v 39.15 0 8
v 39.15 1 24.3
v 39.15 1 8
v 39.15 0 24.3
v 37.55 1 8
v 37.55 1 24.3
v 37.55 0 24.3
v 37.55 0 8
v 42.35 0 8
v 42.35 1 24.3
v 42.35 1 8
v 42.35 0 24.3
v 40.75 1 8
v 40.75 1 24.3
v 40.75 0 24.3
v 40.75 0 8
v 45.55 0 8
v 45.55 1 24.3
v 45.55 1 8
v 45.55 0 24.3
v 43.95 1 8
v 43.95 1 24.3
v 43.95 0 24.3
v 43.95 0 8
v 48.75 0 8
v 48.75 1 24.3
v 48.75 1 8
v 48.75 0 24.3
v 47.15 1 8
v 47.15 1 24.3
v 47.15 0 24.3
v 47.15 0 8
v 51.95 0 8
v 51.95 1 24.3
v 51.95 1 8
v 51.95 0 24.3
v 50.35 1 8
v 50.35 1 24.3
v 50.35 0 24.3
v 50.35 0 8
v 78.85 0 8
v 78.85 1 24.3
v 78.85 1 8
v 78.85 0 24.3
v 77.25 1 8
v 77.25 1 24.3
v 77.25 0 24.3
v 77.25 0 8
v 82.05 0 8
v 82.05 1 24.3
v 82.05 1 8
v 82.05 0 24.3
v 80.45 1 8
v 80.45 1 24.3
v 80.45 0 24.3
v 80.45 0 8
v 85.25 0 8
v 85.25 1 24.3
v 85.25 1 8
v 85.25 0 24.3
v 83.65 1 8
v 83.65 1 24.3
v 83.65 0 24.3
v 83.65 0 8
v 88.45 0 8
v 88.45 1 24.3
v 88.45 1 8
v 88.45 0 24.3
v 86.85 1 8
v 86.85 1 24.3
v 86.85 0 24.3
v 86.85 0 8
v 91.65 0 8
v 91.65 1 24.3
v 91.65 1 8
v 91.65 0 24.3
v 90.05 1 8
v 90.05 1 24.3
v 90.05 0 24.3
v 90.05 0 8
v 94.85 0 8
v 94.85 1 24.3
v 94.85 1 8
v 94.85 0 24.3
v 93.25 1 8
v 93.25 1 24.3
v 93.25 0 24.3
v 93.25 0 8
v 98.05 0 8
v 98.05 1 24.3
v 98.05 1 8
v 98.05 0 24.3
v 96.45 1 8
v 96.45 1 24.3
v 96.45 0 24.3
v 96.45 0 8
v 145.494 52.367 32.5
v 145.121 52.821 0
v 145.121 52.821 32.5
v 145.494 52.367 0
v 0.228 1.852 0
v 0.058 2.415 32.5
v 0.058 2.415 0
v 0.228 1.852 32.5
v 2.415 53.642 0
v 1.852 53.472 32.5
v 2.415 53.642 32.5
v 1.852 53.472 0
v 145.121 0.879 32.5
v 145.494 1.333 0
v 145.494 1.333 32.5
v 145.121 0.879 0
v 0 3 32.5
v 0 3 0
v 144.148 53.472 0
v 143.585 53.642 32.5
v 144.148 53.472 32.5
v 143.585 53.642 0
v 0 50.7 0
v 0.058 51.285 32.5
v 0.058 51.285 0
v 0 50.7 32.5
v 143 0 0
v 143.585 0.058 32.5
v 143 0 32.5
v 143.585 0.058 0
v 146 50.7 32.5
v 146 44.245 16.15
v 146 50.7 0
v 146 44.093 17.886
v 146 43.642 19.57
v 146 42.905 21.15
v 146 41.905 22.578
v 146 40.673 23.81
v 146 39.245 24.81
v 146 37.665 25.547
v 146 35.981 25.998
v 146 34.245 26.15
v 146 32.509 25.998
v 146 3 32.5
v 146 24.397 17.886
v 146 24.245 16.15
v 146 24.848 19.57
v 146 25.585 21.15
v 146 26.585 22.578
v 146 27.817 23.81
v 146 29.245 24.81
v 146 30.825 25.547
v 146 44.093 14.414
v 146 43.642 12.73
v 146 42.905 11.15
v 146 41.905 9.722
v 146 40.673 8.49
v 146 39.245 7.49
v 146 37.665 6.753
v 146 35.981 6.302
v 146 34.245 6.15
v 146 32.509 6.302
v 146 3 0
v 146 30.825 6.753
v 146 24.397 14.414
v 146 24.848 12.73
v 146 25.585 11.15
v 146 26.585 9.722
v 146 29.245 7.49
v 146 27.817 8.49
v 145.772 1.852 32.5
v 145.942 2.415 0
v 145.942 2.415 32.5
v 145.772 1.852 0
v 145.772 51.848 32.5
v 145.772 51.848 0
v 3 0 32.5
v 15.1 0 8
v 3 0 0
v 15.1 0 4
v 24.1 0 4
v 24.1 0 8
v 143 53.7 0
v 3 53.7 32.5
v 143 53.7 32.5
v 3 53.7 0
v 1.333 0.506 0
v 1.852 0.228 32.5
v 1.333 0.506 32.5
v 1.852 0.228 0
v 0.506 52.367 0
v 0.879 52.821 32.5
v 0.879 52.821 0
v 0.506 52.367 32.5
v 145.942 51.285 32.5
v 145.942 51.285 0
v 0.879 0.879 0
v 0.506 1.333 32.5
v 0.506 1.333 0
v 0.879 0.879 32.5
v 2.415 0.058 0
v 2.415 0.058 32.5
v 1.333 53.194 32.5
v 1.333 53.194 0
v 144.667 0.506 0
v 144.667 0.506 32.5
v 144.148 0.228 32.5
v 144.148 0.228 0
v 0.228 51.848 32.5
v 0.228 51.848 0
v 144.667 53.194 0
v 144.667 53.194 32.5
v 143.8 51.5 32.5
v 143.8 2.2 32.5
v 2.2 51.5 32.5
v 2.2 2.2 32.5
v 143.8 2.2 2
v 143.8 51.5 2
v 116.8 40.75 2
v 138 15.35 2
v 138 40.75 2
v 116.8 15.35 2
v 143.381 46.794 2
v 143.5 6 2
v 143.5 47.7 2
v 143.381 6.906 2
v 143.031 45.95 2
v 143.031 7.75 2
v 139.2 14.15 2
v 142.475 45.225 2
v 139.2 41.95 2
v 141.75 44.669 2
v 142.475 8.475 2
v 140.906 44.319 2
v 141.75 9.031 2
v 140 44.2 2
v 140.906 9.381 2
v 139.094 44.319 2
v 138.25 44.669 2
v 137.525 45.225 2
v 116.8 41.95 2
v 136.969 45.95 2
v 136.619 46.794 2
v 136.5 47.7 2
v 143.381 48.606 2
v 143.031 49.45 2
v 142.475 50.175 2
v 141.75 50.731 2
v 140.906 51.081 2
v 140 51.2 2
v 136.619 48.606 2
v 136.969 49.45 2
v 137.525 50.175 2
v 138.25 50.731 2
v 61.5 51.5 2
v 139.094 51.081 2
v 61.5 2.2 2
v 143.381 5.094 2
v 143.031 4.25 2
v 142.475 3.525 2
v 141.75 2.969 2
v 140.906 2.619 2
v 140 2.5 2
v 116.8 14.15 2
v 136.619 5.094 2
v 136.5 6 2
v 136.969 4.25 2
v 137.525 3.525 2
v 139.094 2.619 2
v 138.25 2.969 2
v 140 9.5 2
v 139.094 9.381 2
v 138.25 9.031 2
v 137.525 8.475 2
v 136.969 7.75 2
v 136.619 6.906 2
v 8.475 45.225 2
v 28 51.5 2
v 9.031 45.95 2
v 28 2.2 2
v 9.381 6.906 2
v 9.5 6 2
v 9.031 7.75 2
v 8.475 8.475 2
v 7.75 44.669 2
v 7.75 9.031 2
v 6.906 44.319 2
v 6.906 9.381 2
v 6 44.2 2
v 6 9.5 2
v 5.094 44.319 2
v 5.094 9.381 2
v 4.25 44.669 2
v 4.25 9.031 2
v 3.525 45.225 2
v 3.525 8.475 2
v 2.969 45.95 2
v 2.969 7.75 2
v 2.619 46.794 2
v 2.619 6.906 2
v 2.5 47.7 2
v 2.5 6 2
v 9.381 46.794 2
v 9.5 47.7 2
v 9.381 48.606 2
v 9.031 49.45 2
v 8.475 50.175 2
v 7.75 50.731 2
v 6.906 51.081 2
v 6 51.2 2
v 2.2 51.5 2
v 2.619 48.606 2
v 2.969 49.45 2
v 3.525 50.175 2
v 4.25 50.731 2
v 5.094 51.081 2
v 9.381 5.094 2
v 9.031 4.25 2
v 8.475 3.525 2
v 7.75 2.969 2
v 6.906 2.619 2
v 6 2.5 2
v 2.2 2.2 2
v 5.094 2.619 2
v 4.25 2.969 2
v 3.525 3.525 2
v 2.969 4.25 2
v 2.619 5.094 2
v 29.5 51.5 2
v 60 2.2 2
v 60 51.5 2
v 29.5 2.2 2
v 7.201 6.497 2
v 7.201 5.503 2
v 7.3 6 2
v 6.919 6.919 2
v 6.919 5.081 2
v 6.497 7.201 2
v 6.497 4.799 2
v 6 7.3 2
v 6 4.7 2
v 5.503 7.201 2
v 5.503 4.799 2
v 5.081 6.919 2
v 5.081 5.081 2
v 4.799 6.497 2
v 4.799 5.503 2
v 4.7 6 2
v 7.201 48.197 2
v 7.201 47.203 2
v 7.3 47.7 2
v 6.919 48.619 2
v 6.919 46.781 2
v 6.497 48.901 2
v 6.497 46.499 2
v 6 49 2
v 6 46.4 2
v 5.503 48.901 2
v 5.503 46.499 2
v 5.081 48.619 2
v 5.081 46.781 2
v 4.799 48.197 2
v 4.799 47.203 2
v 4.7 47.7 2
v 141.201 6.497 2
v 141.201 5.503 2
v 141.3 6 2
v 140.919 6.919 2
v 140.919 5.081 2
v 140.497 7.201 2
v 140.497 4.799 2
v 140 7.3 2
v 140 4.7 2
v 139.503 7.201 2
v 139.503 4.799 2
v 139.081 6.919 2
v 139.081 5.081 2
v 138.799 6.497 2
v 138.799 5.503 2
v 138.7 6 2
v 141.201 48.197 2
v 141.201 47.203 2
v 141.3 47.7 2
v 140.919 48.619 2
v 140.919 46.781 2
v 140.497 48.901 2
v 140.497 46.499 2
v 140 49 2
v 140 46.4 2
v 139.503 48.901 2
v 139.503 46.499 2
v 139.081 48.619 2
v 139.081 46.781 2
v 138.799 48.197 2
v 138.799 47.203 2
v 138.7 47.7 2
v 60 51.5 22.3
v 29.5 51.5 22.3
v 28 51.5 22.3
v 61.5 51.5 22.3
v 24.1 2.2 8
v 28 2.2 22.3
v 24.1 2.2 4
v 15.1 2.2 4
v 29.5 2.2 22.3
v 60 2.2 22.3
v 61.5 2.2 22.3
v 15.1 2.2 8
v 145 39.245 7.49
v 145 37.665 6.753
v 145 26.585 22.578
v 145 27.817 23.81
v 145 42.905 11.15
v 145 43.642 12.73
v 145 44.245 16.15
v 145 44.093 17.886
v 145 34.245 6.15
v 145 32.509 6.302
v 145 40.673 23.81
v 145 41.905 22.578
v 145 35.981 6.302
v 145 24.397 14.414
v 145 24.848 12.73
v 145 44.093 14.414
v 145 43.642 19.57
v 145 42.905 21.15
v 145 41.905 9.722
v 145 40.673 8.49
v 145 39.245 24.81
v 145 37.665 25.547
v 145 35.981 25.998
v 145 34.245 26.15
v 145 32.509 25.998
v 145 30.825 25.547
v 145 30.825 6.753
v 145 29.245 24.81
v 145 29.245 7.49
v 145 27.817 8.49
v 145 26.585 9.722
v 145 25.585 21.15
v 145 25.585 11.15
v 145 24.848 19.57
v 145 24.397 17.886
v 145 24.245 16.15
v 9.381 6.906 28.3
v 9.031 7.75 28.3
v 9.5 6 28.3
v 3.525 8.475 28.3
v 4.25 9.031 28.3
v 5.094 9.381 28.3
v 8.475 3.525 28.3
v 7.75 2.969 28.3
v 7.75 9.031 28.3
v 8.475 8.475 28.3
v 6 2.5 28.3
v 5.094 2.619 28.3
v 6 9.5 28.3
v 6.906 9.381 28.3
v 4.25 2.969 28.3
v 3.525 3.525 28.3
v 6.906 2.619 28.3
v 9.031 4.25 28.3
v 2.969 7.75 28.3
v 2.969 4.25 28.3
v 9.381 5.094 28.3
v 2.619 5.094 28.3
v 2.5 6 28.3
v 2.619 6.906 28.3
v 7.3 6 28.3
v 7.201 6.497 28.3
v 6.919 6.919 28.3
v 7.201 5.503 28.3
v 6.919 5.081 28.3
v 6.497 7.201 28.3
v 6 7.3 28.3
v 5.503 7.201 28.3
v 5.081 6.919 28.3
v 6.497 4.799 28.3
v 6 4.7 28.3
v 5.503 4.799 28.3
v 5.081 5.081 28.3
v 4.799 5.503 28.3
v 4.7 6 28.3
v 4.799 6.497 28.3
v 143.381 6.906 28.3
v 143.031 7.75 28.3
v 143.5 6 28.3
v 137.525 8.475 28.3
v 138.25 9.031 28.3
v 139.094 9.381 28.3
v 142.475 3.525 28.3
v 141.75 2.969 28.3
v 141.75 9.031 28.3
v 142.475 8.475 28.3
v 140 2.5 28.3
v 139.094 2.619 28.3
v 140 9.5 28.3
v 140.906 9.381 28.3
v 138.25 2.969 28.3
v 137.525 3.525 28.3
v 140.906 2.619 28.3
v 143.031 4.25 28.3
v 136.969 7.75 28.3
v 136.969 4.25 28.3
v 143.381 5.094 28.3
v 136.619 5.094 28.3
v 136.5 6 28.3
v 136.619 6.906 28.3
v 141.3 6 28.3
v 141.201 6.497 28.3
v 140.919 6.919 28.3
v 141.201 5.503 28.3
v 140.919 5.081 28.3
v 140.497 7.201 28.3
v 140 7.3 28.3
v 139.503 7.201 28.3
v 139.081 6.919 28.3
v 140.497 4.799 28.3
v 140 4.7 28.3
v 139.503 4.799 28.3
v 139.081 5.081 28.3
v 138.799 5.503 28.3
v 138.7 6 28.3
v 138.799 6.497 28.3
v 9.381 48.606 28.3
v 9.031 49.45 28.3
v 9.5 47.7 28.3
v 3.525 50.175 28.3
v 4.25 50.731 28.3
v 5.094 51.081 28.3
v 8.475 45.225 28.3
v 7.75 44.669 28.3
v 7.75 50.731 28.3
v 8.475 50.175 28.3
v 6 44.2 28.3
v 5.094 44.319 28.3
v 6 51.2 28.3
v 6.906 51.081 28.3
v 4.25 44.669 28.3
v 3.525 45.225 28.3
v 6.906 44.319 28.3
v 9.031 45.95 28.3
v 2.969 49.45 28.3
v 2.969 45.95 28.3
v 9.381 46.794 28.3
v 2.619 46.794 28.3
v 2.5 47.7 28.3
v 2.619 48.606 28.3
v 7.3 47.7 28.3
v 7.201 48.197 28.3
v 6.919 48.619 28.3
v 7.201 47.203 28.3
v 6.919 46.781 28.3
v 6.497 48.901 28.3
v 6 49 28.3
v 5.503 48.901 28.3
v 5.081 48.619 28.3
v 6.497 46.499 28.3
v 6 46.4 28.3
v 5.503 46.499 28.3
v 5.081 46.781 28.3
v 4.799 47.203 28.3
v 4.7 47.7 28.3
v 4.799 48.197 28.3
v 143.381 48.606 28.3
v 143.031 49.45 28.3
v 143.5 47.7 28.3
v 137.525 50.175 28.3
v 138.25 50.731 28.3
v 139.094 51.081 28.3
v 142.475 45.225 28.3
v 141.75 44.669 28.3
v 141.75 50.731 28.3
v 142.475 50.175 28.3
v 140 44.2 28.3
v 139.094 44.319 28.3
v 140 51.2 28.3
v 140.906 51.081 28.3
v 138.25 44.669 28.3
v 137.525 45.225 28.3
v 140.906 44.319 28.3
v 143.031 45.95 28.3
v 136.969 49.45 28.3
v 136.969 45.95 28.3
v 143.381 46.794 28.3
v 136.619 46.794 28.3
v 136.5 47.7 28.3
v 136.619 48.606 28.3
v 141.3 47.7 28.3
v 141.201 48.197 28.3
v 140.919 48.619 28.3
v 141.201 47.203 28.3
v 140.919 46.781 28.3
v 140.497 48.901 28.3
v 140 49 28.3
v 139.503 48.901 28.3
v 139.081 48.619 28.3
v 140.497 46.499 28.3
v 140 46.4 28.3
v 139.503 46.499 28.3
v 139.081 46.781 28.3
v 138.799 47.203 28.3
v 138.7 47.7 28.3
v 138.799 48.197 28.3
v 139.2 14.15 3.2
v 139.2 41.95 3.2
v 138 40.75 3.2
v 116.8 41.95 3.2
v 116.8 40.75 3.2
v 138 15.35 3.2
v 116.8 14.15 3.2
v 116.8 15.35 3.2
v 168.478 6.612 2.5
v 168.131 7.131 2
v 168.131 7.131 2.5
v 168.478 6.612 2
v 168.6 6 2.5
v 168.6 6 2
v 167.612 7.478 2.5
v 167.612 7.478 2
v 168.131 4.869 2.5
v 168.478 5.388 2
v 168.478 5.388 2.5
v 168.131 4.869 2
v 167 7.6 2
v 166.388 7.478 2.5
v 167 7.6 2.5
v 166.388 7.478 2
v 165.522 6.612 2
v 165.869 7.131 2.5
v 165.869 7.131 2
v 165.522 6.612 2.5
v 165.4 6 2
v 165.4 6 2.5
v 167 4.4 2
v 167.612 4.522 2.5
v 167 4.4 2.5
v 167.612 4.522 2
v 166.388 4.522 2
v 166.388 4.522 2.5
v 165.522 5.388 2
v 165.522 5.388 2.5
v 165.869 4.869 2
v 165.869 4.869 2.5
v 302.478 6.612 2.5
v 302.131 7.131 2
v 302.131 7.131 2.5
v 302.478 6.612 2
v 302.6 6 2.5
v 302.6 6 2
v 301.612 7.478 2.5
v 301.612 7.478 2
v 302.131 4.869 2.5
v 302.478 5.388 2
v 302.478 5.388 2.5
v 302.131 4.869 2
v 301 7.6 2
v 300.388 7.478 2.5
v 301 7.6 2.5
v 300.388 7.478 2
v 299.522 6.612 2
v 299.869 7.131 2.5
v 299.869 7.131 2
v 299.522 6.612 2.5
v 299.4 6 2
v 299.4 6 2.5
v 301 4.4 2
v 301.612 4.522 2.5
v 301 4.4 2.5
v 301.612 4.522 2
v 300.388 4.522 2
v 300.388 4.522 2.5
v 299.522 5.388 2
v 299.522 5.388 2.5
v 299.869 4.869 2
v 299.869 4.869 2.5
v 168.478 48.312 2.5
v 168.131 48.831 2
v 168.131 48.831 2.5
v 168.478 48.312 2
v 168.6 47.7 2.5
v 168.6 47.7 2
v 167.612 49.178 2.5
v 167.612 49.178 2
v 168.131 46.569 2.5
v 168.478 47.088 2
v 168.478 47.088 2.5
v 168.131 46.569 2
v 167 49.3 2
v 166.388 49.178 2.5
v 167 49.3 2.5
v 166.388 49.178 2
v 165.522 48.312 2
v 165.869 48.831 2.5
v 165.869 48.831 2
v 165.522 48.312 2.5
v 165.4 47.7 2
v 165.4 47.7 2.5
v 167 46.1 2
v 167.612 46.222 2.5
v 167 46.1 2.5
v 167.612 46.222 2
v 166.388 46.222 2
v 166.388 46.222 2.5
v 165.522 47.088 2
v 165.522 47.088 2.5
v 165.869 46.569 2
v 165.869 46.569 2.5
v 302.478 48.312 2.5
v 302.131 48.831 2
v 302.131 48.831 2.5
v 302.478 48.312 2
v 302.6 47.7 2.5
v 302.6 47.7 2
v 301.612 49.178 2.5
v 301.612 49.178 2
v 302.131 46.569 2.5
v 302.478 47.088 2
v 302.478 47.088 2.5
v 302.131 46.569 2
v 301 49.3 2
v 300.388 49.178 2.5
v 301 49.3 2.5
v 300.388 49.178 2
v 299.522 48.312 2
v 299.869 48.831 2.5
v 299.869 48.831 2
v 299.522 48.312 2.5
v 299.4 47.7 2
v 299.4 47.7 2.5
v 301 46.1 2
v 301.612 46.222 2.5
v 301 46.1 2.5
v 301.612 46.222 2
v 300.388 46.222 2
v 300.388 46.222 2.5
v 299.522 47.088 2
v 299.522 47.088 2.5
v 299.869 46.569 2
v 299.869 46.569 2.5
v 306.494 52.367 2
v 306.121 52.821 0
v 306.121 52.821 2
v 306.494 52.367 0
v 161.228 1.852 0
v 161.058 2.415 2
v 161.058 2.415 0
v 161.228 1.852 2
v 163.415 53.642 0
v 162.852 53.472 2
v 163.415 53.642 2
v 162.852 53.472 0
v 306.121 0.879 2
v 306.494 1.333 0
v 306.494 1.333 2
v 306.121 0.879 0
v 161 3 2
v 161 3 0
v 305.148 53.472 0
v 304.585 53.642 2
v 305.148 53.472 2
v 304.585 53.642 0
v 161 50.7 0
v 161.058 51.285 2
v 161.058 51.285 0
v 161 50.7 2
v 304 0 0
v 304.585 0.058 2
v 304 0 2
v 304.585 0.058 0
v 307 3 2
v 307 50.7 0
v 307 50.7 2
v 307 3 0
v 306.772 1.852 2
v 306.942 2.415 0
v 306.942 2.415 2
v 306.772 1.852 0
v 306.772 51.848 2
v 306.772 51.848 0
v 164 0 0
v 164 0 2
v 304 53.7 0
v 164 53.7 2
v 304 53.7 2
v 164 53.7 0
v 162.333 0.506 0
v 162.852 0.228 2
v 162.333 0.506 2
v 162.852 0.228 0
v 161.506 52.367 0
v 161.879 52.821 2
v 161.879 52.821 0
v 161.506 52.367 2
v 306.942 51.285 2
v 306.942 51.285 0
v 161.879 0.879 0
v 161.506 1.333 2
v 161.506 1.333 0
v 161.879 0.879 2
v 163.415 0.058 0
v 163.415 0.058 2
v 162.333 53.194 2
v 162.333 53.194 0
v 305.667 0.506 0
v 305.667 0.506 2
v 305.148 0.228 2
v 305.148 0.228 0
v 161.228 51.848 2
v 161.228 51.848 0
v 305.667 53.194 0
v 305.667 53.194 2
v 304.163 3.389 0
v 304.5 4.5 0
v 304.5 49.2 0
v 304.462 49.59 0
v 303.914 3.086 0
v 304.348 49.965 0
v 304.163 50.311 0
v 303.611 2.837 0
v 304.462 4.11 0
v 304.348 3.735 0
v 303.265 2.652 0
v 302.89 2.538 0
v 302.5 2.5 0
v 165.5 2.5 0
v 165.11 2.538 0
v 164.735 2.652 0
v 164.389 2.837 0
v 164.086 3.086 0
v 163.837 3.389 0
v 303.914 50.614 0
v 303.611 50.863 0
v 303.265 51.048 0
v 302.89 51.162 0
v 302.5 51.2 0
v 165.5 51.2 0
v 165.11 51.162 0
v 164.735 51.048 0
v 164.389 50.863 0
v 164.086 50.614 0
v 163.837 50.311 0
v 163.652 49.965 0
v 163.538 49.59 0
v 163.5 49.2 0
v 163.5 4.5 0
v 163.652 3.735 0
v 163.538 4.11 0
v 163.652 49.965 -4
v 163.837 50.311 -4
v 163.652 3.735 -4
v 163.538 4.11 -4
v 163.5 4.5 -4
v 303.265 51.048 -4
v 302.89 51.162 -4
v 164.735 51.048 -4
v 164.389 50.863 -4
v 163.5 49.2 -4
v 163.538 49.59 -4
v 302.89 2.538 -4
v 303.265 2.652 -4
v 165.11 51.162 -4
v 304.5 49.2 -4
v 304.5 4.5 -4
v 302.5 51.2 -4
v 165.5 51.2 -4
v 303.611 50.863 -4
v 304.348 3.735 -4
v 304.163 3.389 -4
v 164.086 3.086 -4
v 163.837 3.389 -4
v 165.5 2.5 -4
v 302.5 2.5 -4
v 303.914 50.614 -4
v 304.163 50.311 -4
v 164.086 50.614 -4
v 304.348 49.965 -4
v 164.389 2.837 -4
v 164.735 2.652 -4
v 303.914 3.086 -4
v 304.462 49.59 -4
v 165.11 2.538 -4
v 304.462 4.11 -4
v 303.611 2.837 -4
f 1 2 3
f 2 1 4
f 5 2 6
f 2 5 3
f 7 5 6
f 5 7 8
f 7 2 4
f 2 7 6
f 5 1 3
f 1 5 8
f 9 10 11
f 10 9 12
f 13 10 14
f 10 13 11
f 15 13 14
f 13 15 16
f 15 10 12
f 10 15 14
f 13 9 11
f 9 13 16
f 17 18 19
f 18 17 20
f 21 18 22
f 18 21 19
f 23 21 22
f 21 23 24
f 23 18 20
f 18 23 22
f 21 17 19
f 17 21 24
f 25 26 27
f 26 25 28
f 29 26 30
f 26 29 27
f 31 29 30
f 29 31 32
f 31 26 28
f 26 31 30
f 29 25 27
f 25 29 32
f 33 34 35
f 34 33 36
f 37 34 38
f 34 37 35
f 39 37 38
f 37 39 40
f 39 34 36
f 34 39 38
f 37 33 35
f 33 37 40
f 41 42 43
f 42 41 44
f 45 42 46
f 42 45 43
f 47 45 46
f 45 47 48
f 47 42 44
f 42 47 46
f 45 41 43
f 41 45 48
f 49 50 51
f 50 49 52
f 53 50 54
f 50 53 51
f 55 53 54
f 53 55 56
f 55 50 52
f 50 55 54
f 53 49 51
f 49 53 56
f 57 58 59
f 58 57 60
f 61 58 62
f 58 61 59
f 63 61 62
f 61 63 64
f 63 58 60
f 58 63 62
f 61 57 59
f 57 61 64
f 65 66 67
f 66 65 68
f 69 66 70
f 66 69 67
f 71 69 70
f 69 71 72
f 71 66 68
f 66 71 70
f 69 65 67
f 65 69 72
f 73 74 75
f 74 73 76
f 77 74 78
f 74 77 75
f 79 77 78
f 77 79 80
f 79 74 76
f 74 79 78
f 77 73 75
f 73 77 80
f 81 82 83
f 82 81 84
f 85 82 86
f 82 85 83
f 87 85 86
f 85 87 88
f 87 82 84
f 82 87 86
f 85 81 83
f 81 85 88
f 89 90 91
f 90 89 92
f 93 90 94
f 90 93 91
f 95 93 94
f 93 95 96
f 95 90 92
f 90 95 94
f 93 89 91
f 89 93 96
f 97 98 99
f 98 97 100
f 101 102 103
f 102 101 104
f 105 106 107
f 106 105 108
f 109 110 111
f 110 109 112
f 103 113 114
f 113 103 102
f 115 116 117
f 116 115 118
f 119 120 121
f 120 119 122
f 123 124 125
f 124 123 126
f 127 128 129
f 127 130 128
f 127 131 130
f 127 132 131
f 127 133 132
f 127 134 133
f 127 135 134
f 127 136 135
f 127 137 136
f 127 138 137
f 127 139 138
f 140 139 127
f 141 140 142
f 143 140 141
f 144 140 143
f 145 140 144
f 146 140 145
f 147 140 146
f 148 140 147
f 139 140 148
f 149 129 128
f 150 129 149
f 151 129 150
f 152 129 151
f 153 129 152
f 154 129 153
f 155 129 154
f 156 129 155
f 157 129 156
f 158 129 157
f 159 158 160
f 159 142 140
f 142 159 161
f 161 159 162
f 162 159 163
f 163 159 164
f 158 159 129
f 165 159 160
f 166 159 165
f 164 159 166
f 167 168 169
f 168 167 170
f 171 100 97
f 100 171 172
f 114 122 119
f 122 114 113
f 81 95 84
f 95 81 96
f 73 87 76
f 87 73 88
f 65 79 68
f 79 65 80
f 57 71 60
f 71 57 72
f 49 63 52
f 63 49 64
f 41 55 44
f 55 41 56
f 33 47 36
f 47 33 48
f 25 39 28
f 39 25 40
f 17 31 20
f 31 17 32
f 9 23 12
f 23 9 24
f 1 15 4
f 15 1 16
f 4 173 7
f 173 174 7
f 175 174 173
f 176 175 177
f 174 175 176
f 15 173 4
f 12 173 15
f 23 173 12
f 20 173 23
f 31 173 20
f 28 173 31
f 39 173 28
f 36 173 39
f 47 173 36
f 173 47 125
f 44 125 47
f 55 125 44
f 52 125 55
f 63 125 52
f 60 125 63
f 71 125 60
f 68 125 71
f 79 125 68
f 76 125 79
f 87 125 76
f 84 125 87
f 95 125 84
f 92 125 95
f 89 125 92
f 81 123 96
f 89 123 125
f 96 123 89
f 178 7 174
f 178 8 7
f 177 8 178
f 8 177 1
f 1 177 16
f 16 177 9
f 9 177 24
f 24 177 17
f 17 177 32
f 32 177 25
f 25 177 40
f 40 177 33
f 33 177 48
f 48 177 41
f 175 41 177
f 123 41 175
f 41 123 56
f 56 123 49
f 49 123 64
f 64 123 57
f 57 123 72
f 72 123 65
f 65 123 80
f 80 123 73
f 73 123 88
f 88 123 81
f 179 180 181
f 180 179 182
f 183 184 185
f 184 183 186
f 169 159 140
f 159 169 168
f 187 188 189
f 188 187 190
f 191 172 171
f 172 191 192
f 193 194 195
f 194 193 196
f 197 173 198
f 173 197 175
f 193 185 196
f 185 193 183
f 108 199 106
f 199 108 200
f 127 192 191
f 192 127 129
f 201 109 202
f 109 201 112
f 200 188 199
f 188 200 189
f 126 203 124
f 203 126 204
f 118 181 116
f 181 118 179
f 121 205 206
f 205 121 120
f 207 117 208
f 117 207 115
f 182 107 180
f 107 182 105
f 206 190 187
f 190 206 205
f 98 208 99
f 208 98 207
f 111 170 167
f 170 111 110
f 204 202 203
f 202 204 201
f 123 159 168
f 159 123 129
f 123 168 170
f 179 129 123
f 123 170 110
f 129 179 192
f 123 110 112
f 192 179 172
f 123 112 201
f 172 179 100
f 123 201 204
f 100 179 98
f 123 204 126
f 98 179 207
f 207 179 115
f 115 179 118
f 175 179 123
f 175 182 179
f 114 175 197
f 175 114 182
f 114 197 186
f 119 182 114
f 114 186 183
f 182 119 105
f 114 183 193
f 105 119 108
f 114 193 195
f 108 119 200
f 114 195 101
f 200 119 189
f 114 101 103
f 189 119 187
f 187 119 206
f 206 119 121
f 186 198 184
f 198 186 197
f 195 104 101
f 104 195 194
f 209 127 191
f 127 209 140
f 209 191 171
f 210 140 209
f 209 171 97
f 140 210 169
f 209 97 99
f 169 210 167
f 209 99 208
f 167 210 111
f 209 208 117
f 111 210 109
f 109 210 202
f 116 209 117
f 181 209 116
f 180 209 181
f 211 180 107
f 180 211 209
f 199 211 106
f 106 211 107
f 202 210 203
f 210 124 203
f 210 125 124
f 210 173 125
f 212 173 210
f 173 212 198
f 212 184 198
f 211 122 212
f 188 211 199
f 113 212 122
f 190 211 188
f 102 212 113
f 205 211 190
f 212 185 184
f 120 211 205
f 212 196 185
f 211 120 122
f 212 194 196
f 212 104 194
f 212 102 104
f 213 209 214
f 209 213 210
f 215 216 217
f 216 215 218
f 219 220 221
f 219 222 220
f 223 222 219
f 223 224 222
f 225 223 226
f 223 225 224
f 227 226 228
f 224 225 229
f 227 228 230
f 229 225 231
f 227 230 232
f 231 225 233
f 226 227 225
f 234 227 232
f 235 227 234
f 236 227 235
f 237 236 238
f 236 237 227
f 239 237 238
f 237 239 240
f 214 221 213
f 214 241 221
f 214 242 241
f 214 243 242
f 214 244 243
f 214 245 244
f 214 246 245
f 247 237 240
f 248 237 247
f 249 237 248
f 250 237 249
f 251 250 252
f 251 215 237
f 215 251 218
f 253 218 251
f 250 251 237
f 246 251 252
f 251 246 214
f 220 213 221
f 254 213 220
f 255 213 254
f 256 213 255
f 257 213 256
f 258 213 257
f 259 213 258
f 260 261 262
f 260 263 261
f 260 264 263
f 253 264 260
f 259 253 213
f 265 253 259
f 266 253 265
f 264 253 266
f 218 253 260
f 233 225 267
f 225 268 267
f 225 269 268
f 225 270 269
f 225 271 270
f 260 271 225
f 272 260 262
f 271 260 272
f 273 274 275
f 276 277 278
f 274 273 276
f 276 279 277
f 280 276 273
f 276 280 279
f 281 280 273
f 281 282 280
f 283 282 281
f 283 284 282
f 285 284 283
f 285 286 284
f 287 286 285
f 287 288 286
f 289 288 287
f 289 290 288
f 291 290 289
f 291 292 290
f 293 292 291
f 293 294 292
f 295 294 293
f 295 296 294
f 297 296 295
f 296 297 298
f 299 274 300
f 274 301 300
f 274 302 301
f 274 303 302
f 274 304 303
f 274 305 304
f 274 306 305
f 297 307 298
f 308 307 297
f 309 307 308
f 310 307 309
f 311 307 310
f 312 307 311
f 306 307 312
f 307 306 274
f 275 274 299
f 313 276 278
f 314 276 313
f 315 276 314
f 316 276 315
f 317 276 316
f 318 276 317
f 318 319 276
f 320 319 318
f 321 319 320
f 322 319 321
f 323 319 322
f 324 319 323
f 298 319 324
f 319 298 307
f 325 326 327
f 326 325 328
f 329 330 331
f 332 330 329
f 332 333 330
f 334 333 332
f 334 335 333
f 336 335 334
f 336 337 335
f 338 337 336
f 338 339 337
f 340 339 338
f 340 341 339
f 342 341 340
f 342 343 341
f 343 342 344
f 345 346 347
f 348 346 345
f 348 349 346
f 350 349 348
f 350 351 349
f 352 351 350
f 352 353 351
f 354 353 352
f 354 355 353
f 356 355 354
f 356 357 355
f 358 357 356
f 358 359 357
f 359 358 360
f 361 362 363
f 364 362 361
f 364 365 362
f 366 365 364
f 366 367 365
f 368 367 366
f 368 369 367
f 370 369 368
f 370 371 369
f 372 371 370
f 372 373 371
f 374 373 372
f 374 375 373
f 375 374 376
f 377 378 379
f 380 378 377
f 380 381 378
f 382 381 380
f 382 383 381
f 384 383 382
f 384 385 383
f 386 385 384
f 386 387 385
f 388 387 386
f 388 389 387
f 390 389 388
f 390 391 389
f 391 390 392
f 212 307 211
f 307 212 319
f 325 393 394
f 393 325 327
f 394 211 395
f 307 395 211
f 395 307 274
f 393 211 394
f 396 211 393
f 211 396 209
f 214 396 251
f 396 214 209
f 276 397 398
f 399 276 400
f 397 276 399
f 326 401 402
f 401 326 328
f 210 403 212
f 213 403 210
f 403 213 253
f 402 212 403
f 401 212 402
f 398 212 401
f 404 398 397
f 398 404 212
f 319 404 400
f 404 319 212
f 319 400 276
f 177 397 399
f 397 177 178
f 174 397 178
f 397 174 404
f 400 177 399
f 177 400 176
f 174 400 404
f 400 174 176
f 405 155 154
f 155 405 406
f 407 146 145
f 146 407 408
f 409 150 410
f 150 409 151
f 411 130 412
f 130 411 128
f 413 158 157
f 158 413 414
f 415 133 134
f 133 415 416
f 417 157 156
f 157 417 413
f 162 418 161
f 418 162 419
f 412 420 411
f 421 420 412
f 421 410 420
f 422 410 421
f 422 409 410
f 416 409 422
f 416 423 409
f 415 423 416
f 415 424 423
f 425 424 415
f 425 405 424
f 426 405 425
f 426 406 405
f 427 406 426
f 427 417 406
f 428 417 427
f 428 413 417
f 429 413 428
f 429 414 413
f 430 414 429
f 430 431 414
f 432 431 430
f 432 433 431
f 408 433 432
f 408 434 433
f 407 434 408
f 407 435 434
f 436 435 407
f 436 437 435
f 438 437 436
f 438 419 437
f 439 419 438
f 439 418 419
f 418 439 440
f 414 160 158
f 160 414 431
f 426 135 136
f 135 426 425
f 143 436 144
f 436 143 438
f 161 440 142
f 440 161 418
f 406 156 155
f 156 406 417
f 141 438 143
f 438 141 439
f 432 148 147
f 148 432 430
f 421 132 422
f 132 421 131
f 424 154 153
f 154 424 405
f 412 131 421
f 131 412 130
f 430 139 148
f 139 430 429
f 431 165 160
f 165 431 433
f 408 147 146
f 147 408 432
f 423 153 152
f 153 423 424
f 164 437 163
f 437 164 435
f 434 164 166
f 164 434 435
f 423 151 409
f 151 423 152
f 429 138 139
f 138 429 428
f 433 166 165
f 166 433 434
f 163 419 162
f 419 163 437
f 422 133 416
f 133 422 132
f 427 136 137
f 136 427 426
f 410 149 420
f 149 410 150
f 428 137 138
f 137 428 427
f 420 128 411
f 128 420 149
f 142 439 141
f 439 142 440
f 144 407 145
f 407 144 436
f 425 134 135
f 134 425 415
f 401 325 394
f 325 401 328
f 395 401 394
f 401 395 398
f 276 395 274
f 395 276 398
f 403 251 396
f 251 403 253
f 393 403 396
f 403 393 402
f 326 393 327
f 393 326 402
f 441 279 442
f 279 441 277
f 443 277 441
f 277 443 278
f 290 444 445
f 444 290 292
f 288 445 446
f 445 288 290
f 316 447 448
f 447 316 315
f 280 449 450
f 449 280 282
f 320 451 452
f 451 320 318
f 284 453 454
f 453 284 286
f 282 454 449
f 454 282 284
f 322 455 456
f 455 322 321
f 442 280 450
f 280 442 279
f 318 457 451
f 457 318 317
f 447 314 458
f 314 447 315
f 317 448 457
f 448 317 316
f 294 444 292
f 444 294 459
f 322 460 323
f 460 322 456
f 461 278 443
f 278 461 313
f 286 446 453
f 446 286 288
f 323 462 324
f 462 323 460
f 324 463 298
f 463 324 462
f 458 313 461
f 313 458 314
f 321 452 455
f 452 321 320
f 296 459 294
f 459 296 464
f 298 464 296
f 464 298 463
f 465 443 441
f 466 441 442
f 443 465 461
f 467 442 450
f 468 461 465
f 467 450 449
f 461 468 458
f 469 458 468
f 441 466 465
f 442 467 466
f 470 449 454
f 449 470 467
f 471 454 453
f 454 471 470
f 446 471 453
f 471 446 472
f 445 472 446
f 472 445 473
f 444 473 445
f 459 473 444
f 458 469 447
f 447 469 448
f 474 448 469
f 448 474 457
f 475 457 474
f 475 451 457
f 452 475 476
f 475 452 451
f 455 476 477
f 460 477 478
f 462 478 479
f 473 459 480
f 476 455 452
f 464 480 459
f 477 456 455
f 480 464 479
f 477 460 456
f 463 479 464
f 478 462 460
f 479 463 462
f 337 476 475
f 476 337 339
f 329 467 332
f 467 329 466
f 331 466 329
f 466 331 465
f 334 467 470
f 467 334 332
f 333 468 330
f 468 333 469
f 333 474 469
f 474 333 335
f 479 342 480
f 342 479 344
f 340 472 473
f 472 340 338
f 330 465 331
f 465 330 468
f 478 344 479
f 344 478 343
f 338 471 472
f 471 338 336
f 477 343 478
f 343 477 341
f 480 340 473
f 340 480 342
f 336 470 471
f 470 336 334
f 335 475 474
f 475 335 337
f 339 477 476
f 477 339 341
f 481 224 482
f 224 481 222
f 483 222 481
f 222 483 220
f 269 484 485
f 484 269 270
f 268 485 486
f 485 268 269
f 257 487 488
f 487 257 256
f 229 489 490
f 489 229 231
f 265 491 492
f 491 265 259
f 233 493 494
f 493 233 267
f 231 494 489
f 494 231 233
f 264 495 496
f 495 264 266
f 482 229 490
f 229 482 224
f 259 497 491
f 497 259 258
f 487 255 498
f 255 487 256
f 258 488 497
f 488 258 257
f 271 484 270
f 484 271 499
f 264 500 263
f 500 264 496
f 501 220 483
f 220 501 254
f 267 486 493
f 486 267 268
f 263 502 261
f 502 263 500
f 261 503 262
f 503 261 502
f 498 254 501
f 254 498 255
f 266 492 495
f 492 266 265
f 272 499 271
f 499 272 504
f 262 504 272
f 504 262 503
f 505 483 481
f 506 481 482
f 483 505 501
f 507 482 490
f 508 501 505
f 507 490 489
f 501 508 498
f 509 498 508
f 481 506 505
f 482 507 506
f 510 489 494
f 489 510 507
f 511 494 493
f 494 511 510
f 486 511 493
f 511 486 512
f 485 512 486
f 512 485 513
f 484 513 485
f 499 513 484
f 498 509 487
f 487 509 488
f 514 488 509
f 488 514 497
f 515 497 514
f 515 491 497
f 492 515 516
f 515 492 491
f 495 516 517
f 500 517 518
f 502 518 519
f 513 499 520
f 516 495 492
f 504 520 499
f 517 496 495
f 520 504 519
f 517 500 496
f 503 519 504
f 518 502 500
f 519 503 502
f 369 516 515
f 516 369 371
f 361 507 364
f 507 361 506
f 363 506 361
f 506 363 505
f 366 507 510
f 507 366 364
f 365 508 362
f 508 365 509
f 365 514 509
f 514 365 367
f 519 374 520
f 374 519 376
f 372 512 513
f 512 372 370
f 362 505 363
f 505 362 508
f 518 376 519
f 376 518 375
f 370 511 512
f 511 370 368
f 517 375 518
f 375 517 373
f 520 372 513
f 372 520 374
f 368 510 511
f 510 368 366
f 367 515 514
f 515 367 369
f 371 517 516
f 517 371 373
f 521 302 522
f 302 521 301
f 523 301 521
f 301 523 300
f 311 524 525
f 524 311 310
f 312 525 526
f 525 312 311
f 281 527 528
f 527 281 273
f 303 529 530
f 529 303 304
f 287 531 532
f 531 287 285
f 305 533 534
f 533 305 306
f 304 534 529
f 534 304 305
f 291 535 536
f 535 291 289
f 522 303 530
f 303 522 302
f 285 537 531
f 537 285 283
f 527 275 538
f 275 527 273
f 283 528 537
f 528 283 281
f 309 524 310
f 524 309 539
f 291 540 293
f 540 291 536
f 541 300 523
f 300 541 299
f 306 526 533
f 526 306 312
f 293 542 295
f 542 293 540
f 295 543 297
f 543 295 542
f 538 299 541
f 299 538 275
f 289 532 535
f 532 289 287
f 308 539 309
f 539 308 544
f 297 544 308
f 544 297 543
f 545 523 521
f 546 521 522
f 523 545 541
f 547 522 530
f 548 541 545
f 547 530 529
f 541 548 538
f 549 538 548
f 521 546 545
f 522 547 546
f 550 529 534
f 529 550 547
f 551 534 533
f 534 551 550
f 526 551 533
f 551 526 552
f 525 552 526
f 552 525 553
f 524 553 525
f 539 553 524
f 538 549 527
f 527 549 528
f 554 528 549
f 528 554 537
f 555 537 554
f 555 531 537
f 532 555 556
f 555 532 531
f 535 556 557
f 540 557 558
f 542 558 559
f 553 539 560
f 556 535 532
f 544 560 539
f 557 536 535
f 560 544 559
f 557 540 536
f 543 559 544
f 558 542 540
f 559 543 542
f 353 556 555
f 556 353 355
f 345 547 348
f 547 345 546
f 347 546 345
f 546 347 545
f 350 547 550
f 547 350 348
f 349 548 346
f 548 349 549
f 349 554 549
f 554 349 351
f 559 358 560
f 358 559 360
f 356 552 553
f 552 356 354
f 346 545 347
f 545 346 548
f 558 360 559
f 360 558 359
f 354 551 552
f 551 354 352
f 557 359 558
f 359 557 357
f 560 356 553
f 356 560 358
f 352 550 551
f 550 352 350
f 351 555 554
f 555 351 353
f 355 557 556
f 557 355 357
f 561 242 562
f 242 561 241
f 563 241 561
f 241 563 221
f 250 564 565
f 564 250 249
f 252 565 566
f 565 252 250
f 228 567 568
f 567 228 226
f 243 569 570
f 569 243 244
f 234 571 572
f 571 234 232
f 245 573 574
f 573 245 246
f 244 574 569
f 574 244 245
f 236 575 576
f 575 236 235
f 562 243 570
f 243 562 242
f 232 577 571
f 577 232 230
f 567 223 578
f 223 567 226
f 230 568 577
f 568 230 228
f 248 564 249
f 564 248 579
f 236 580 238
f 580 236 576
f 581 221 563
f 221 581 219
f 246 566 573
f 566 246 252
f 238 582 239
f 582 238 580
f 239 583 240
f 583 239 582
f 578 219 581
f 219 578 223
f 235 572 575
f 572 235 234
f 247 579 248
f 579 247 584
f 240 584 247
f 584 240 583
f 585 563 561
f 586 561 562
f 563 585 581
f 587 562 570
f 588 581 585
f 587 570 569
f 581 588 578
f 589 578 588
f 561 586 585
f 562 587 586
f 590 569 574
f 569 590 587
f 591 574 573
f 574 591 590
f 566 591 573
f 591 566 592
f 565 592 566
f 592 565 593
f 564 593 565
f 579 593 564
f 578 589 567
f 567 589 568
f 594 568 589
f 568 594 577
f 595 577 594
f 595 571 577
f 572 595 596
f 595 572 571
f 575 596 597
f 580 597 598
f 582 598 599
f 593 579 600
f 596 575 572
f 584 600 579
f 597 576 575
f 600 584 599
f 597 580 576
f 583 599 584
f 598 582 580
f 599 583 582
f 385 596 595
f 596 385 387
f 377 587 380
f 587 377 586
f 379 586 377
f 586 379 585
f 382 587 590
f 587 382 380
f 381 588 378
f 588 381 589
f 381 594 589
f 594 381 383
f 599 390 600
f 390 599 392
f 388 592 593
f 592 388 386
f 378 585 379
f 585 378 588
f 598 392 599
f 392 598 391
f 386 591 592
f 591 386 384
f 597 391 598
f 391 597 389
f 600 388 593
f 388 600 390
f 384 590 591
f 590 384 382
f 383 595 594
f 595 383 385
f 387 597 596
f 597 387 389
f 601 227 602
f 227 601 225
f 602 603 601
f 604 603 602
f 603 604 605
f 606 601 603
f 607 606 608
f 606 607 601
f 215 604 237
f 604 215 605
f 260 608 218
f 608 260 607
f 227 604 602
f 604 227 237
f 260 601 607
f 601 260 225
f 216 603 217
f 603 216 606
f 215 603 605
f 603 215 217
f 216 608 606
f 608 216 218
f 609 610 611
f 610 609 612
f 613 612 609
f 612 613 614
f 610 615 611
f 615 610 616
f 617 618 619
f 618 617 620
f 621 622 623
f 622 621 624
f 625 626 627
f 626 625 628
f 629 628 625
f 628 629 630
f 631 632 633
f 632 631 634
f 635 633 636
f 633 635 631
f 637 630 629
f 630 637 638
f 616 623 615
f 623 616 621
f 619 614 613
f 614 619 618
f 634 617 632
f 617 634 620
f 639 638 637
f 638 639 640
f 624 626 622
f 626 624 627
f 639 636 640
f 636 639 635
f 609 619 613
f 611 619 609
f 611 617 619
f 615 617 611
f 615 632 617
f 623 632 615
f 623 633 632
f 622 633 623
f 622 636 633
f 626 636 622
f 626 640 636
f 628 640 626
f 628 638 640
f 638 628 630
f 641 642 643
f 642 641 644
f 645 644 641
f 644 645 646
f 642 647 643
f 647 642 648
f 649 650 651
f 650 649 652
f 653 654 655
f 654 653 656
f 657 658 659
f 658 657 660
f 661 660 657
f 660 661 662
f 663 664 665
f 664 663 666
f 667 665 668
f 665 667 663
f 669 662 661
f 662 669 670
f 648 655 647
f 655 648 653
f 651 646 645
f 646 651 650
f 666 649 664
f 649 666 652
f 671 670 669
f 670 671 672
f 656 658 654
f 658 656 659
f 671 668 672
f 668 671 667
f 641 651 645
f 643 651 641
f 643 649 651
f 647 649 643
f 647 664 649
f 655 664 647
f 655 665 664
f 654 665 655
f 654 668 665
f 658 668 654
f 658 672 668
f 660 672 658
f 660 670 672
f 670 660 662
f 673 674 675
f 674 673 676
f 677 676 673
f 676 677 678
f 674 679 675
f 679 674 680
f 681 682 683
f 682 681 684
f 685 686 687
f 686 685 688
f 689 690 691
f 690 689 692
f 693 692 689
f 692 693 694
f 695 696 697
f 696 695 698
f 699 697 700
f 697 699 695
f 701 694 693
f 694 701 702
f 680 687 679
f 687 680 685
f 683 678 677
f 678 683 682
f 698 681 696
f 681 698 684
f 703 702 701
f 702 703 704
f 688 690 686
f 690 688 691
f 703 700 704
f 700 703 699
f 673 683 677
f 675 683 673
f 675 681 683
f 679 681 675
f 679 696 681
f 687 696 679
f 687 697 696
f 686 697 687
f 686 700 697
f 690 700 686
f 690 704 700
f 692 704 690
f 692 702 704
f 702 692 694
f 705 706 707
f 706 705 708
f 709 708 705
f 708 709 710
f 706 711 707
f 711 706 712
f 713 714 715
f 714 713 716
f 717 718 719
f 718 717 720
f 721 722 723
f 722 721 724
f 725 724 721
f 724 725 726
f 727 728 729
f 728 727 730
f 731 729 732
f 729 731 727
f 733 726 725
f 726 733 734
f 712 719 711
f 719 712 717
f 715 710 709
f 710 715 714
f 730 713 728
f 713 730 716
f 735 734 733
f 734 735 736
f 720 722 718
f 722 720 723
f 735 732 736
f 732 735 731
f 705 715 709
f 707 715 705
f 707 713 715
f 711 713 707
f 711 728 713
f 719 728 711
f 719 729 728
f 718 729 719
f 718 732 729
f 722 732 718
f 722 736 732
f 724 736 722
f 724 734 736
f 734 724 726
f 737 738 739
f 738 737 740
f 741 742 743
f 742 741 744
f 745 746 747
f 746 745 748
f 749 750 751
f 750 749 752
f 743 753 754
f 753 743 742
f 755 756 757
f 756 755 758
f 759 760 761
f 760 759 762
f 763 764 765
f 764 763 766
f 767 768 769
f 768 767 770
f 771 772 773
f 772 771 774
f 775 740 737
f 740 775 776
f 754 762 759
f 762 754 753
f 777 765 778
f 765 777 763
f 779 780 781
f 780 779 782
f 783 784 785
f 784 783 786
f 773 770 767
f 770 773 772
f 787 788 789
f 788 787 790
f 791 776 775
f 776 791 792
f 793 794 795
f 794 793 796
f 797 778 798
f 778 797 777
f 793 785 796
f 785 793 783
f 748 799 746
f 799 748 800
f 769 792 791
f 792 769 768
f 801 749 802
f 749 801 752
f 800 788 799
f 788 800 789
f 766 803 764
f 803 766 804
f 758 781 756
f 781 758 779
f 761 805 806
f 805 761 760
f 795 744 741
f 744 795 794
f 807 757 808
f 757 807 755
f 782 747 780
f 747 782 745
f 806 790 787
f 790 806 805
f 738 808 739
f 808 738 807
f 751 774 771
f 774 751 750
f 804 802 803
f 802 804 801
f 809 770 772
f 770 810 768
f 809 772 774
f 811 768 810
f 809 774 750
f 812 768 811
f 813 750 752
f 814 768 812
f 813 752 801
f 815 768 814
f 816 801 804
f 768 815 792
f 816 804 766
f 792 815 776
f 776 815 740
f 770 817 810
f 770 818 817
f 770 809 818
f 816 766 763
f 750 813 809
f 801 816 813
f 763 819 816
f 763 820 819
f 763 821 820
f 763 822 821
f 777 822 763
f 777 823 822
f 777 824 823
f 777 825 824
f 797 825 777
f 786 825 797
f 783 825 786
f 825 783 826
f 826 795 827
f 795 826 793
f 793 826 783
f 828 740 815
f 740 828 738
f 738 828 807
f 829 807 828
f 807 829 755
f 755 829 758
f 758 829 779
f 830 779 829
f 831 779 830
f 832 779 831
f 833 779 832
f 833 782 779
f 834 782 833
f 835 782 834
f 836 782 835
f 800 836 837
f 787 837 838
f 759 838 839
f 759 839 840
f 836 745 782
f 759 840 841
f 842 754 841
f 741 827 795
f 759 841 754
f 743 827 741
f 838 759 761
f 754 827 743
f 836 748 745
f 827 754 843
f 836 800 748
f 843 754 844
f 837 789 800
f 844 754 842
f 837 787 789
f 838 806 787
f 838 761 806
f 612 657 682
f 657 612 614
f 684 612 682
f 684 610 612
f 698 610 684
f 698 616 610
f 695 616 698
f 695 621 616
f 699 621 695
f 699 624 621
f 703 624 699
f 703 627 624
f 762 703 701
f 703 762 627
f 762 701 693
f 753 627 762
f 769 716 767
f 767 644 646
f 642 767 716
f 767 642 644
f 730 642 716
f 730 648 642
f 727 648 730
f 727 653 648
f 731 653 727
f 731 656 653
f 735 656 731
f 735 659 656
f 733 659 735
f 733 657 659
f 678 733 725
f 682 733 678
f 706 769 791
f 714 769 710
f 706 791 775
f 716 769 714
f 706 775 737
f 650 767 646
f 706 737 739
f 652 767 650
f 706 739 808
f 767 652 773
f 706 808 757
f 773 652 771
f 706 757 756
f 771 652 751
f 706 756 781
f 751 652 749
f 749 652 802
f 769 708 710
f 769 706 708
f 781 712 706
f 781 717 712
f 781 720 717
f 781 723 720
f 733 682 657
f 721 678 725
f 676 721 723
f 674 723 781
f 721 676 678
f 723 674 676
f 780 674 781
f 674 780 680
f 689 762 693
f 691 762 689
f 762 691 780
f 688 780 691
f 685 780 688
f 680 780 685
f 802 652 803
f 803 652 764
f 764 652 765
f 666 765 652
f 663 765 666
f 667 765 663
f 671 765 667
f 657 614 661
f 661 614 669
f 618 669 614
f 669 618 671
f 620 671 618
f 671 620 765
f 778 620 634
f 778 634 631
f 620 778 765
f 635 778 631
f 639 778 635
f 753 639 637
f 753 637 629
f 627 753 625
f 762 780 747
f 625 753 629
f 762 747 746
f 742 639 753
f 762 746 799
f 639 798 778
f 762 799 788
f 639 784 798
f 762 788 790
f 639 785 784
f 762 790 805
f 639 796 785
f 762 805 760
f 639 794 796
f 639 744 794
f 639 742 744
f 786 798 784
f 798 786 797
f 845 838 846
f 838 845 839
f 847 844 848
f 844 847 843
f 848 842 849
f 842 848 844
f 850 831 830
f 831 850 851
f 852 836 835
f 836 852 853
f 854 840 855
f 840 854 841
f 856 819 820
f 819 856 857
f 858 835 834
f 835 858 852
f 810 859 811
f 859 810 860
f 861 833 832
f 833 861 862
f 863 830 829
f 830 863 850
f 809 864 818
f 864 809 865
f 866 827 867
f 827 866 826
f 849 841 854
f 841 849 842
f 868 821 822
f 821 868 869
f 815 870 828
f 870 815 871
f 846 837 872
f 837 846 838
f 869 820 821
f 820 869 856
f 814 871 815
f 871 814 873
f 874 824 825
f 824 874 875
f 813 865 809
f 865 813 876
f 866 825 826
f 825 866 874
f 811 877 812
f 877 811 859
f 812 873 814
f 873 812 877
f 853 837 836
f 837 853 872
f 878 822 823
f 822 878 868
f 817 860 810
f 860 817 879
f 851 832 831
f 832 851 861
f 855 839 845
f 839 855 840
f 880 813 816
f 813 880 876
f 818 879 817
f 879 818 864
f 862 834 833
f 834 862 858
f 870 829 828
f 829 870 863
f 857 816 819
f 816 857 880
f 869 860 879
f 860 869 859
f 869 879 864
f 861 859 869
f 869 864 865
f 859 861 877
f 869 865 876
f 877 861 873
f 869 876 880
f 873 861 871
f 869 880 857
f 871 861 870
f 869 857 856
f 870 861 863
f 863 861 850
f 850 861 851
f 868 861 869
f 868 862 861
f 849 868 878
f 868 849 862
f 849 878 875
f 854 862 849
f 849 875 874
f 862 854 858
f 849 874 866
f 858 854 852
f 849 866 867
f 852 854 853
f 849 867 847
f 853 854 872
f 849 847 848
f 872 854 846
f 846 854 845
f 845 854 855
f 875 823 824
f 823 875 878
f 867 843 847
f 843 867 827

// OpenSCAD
// Bedroom Air Monitor — sensor enclosure, first rough draft.
//
// Open this in OpenSCAD (free: openscad.org) to view and export an STL. This is a CONCEPT model —
// dimensions marked "verified" come from Adafruit/Sensirion's own specs; anything marked
// "estimated" is a guess and should be checked against the real part before printing final.
//
// Layout, left to right: [ QT Py bay ][ SCD-41 bay, vented front ][ SEN54 module + its own STEMMA
// QT adapter board, vented front + side ]. Two open compartments (no dividing wall to the ceiling
// — STEMMA QT cables run between bays), one lid. USB-C cable exits the back.
//
// The SEN54 module and its small STEMMA QT adapter board (Adafruit #5964) both live in the same
// bay, wired to each other with the 6-pin JST-GH cable — that cable stays fully internal, it never
// needs to leave the case.

/* [Part to render] */
part = "both"; // [base, lid, both]

/* [Wall & fit] */
wall = 2.2;           // mm, printed wall thickness
floor = 2.0;          // mm, base floor thickness
lid_thickness = 2.0;
fit_gap = 0.3;         // mm, clearance between lid lip and base wall (per side)
corner_r = 3;          // outer corner rounding

/* [QT Py — verified 21.8 x 17.9 x 5.7mm, Adafruit #5325] */
qtpy_l = 21.8;
qtpy_w = 17.9;
qtpy_h = 5.7;
qtpy_clear = 4;        // mm clearance around the board for its bay

/* [SCD-41 breakout — verified 25.5 x 22.8 x 7.7mm, Adafruit #5190] */
scd_l = 25.5;
scd_w = 22.8;
scd_h = 7.7;
scd_clear = 5;

/* [SEN54 module — verified 52.3 x 43.3 x 22.3mm, Sensirion datasheet] */
sen_l = 52.3;
sen_w = 43.3;
sen_h = 22.3;
sen_clear = 6;         // more clearance: fan needs open air, not a snug fit

/* [SEN5x STEMMA QT adapter board — verified 25.4 x 20.0 x 5.0mm, measured by Markus] */
adapter_l = 25.4;
adapter_w = 20.0;
adapter_h = 5.0;
adapter_clear = 4;

// End-of-bay space reserved for the module's own connector tab (roughly 17mm per the datasheet's
// side-view drawing — still an ESTIMATE, the drawing doesn't label that clearly) AND for the
// adapter board sitting beside it. Whichever needs more room end to end wins; both fit
// side-by-side across the bay's width, which is wide open back there (see sen_bay_w below).
sen_tail_l = max(17, adapter_w + adapter_clear);

/* [Derived bay sizes — internal, before walls] */
qtpy_bay_l = qtpy_l + qtpy_clear;
qtpy_bay_w = qtpy_w + qtpy_clear;
scd_bay_l  = scd_l + scd_clear;
scd_bay_w  = scd_w + scd_clear;
sen_bay_l  = sen_l + sen_clear + sen_tail_l;
sen_bay_w  = sen_w + sen_clear;

inner_h = max(qtpy_h, scd_h, sen_h) + 6;   // headroom above the tallest part for cables/lid clearance
case_h  = floor + inner_h + wall;           // outer height of the base

// Internal length is the three bays side by side, separated by thin internal ribs (not full walls —
// STEMMA QT cables need to pass between them).
rib = 1.5;
inner_l = qtpy_bay_l + rib + scd_bay_l + rib + sen_bay_l;
inner_w = max(qtpy_bay_w, scd_bay_w, sen_bay_w);

case_l = inner_l + 2 * wall;
case_w = inner_w + 2 * wall;

echo(str("Outer footprint: ", case_l, " x ", case_w, " x ", case_h, " mm"));

/* [Vent slots] */
slot_w = 1.6;
slot_gap = 1.6;
slot_margin = 4;

module vent_slots(panel_w, panel_h, count) {
  // A row of horizontal slots, centered, for a passive/active air vent on a front panel.
  total_w = count * slot_w + (count - 1) * slot_gap;
  start_x = -total_w / 2;
  for (i = [0 : count - 1])
    translate([start_x + i * (slot_w + slot_gap), -panel_h / 2 + slot_margin, -1])
      cube([slot_w, panel_h - 2 * slot_margin, wall + 2]);
}

// A 2D rounded-rectangle outline — used as the profile for linear_extrude below. Must stay 2D
// (circle, not cylinder) or linear_extrude silently drops it.
module rounded_rect(l, w, r) {
  hull() {
    for (x = [r, l - r])
      for (y = [r, w - r])
        translate([x, y, 0]) circle(r = r, $fn = 32);
  }
}

module screw_boss(h) {
  difference() {
    cylinder(h = h, d = 7, $fn = 24);
    translate([0, 0, -0.5]) cylinder(h = h + 1, d = 2.6, $fn = 16); // M3 self-tap pilot hole
  }
}

module case_base() {
  x_qtpy = wall;
  x_scd  = x_qtpy + qtpy_bay_l + rib;
  x_sen  = x_scd + scd_bay_l + rib;

  difference() {
    // Outer shell
    linear_extrude(height = case_h)
      rounded_rect(case_l, case_w, corner_r);

    // Hollow out the inside, leaving `wall` on the sides and `floor` on the bottom. Screw bosses
    // and ribs are added back AFTER this cut (below) — adding them before, inside the same union
    // that gets hollowed out, would have deleted them: they sit inside the exact region this cube
    // removes, and subtracting the same cube from a union subtracts it from every member of that
    // union too. (Caught this by test-exporting the STL and checking the boss holes existed.)
    translate([wall, wall, floor])
      cube([case_l - 2 * wall, case_w - 2 * wall, case_h]);

    // USB-C cable exit, back wall, centered on the QT Py bay
    translate([x_qtpy + qtpy_bay_l / 2, -1, floor + 2])
      cube([9, wall + 2, 4], center = false);

    // SCD-41 bay: passive vent slots on the front wall
    translate([x_scd + scd_bay_l / 2, 0, floor + inner_h / 2])
      rotate([90, 0, 0])
        vent_slots(scd_bay_w, inner_h - 4, 5);

    // SEN54 bay: intake slots on the front wall
    translate([x_sen + sen_l / 2, 0, floor + inner_h / 2])
      rotate([90, 0, 0])
        vent_slots(sen_w - 6, inner_h - 4, 7);

    // SEN54 bay: fan grille on the right side wall (round cutout, roughly matching the module's
    // fan opening per the datasheet drawing — position is an ESTIMATE, adjust once the module is
    // in hand and you can see exactly where the fan opening lines up)
    translate([case_l - 1, wall + sen_bay_w * 0.65, floor + inner_h / 2])
      rotate([0, 90, 0])
        cylinder(h = wall + 2, d = 20, $fn = 36);
  }

  // Rebuild the two internal ribs (thin, with a gap near the top for cables to cross over).
  // Overlap slightly into the front/back walls and the floor (0.2mm) rather than touch them
  // exactly — an exact zero-thickness touch can leave the boolean union as two separate solids
  // instead of one fused part.
  ov = 0.2;
  for (x = [x_qtpy + qtpy_bay_l, x_scd + scd_bay_l])
    translate([x, wall - ov, floor - ov])
      cube([rib, case_w - 2 * wall + 2 * ov, inner_h - 8 + ov]); // 8mm cable gap at the top

  // Corner screw bosses, inset from the outer corners — added here (after the cavity cut, not
  // before) so they actually survive. Overlapped 0.2mm into the floor for the same fusing reason.
  for (pos = [[6, 6], [case_l - 6, 6], [6, case_w - 6], [case_l - 6, case_w - 6]])
    translate([pos[0], pos[1], floor - ov]) screw_boss(inner_h - 2 + ov);

  // Adapter board nest: a locating lip on the floor at the far end of the SEN54 bay (beyond the
  // module's own footprint, away from the rib), sized to the board Markus actually measured.
  // No mounting holes assumed — this Adafruit breakout's hole pattern isn't published, so it's a
  // friction-fit nest (open on the side facing the module, for the JST-GH cable) rather than a
  // screwed mount. Add double-sided tape if it needs to stay put.
  adapter_x = x_sen + sen_l + sen_clear / 2;
  adapter_y = wall + (sen_bay_w - adapter_l) / 2;
  lip = 1.2;
  translate([adapter_x, adapter_y, floor])
    difference() {
      cube([adapter_w + 2 * lip, adapter_l + 2 * lip, lip]);       // outer block
      translate([lip, lip, -0.5])
        cube([adapter_w, adapter_l, lip + 1]);                     // hollow out the board footprint
      translate([-0.5, lip, -0.5])
        cube([lip + 1, adapter_l, lip + 1]);                       // open one side for the JST-GH cable
    }
}

module case_lid() {
  lip_h = 4;
  translate([case_l + 15, 0, 0]) { // offset in the viewport so base + lid don't overlap
    union() {
      linear_extrude(height = lid_thickness)
        rounded_rect(case_l, case_w, corner_r);
      // Lip that drops down inside the base's walls
      translate([wall + fit_gap, wall + fit_gap, -lip_h])
        linear_extrude(height = lip_h)
          rounded_rect(case_l - 2 * (wall + fit_gap), case_w - 2 * (wall + fit_gap), corner_r - 1);
      // Screw holes matching the base's bosses
      for (pos = [[6, 6], [case_l - 6, 6], [6, case_w - 6], [case_l - 6, case_w - 6]])
        translate([pos[0], pos[1], -0.5])
          cylinder(h = lid_thickness + 1, d = 3.2, $fn = 16);
    }
  }
}

if (part == "base" || part == "both") case_base();
if (part == "lid"  || part == "both") case_lid();
